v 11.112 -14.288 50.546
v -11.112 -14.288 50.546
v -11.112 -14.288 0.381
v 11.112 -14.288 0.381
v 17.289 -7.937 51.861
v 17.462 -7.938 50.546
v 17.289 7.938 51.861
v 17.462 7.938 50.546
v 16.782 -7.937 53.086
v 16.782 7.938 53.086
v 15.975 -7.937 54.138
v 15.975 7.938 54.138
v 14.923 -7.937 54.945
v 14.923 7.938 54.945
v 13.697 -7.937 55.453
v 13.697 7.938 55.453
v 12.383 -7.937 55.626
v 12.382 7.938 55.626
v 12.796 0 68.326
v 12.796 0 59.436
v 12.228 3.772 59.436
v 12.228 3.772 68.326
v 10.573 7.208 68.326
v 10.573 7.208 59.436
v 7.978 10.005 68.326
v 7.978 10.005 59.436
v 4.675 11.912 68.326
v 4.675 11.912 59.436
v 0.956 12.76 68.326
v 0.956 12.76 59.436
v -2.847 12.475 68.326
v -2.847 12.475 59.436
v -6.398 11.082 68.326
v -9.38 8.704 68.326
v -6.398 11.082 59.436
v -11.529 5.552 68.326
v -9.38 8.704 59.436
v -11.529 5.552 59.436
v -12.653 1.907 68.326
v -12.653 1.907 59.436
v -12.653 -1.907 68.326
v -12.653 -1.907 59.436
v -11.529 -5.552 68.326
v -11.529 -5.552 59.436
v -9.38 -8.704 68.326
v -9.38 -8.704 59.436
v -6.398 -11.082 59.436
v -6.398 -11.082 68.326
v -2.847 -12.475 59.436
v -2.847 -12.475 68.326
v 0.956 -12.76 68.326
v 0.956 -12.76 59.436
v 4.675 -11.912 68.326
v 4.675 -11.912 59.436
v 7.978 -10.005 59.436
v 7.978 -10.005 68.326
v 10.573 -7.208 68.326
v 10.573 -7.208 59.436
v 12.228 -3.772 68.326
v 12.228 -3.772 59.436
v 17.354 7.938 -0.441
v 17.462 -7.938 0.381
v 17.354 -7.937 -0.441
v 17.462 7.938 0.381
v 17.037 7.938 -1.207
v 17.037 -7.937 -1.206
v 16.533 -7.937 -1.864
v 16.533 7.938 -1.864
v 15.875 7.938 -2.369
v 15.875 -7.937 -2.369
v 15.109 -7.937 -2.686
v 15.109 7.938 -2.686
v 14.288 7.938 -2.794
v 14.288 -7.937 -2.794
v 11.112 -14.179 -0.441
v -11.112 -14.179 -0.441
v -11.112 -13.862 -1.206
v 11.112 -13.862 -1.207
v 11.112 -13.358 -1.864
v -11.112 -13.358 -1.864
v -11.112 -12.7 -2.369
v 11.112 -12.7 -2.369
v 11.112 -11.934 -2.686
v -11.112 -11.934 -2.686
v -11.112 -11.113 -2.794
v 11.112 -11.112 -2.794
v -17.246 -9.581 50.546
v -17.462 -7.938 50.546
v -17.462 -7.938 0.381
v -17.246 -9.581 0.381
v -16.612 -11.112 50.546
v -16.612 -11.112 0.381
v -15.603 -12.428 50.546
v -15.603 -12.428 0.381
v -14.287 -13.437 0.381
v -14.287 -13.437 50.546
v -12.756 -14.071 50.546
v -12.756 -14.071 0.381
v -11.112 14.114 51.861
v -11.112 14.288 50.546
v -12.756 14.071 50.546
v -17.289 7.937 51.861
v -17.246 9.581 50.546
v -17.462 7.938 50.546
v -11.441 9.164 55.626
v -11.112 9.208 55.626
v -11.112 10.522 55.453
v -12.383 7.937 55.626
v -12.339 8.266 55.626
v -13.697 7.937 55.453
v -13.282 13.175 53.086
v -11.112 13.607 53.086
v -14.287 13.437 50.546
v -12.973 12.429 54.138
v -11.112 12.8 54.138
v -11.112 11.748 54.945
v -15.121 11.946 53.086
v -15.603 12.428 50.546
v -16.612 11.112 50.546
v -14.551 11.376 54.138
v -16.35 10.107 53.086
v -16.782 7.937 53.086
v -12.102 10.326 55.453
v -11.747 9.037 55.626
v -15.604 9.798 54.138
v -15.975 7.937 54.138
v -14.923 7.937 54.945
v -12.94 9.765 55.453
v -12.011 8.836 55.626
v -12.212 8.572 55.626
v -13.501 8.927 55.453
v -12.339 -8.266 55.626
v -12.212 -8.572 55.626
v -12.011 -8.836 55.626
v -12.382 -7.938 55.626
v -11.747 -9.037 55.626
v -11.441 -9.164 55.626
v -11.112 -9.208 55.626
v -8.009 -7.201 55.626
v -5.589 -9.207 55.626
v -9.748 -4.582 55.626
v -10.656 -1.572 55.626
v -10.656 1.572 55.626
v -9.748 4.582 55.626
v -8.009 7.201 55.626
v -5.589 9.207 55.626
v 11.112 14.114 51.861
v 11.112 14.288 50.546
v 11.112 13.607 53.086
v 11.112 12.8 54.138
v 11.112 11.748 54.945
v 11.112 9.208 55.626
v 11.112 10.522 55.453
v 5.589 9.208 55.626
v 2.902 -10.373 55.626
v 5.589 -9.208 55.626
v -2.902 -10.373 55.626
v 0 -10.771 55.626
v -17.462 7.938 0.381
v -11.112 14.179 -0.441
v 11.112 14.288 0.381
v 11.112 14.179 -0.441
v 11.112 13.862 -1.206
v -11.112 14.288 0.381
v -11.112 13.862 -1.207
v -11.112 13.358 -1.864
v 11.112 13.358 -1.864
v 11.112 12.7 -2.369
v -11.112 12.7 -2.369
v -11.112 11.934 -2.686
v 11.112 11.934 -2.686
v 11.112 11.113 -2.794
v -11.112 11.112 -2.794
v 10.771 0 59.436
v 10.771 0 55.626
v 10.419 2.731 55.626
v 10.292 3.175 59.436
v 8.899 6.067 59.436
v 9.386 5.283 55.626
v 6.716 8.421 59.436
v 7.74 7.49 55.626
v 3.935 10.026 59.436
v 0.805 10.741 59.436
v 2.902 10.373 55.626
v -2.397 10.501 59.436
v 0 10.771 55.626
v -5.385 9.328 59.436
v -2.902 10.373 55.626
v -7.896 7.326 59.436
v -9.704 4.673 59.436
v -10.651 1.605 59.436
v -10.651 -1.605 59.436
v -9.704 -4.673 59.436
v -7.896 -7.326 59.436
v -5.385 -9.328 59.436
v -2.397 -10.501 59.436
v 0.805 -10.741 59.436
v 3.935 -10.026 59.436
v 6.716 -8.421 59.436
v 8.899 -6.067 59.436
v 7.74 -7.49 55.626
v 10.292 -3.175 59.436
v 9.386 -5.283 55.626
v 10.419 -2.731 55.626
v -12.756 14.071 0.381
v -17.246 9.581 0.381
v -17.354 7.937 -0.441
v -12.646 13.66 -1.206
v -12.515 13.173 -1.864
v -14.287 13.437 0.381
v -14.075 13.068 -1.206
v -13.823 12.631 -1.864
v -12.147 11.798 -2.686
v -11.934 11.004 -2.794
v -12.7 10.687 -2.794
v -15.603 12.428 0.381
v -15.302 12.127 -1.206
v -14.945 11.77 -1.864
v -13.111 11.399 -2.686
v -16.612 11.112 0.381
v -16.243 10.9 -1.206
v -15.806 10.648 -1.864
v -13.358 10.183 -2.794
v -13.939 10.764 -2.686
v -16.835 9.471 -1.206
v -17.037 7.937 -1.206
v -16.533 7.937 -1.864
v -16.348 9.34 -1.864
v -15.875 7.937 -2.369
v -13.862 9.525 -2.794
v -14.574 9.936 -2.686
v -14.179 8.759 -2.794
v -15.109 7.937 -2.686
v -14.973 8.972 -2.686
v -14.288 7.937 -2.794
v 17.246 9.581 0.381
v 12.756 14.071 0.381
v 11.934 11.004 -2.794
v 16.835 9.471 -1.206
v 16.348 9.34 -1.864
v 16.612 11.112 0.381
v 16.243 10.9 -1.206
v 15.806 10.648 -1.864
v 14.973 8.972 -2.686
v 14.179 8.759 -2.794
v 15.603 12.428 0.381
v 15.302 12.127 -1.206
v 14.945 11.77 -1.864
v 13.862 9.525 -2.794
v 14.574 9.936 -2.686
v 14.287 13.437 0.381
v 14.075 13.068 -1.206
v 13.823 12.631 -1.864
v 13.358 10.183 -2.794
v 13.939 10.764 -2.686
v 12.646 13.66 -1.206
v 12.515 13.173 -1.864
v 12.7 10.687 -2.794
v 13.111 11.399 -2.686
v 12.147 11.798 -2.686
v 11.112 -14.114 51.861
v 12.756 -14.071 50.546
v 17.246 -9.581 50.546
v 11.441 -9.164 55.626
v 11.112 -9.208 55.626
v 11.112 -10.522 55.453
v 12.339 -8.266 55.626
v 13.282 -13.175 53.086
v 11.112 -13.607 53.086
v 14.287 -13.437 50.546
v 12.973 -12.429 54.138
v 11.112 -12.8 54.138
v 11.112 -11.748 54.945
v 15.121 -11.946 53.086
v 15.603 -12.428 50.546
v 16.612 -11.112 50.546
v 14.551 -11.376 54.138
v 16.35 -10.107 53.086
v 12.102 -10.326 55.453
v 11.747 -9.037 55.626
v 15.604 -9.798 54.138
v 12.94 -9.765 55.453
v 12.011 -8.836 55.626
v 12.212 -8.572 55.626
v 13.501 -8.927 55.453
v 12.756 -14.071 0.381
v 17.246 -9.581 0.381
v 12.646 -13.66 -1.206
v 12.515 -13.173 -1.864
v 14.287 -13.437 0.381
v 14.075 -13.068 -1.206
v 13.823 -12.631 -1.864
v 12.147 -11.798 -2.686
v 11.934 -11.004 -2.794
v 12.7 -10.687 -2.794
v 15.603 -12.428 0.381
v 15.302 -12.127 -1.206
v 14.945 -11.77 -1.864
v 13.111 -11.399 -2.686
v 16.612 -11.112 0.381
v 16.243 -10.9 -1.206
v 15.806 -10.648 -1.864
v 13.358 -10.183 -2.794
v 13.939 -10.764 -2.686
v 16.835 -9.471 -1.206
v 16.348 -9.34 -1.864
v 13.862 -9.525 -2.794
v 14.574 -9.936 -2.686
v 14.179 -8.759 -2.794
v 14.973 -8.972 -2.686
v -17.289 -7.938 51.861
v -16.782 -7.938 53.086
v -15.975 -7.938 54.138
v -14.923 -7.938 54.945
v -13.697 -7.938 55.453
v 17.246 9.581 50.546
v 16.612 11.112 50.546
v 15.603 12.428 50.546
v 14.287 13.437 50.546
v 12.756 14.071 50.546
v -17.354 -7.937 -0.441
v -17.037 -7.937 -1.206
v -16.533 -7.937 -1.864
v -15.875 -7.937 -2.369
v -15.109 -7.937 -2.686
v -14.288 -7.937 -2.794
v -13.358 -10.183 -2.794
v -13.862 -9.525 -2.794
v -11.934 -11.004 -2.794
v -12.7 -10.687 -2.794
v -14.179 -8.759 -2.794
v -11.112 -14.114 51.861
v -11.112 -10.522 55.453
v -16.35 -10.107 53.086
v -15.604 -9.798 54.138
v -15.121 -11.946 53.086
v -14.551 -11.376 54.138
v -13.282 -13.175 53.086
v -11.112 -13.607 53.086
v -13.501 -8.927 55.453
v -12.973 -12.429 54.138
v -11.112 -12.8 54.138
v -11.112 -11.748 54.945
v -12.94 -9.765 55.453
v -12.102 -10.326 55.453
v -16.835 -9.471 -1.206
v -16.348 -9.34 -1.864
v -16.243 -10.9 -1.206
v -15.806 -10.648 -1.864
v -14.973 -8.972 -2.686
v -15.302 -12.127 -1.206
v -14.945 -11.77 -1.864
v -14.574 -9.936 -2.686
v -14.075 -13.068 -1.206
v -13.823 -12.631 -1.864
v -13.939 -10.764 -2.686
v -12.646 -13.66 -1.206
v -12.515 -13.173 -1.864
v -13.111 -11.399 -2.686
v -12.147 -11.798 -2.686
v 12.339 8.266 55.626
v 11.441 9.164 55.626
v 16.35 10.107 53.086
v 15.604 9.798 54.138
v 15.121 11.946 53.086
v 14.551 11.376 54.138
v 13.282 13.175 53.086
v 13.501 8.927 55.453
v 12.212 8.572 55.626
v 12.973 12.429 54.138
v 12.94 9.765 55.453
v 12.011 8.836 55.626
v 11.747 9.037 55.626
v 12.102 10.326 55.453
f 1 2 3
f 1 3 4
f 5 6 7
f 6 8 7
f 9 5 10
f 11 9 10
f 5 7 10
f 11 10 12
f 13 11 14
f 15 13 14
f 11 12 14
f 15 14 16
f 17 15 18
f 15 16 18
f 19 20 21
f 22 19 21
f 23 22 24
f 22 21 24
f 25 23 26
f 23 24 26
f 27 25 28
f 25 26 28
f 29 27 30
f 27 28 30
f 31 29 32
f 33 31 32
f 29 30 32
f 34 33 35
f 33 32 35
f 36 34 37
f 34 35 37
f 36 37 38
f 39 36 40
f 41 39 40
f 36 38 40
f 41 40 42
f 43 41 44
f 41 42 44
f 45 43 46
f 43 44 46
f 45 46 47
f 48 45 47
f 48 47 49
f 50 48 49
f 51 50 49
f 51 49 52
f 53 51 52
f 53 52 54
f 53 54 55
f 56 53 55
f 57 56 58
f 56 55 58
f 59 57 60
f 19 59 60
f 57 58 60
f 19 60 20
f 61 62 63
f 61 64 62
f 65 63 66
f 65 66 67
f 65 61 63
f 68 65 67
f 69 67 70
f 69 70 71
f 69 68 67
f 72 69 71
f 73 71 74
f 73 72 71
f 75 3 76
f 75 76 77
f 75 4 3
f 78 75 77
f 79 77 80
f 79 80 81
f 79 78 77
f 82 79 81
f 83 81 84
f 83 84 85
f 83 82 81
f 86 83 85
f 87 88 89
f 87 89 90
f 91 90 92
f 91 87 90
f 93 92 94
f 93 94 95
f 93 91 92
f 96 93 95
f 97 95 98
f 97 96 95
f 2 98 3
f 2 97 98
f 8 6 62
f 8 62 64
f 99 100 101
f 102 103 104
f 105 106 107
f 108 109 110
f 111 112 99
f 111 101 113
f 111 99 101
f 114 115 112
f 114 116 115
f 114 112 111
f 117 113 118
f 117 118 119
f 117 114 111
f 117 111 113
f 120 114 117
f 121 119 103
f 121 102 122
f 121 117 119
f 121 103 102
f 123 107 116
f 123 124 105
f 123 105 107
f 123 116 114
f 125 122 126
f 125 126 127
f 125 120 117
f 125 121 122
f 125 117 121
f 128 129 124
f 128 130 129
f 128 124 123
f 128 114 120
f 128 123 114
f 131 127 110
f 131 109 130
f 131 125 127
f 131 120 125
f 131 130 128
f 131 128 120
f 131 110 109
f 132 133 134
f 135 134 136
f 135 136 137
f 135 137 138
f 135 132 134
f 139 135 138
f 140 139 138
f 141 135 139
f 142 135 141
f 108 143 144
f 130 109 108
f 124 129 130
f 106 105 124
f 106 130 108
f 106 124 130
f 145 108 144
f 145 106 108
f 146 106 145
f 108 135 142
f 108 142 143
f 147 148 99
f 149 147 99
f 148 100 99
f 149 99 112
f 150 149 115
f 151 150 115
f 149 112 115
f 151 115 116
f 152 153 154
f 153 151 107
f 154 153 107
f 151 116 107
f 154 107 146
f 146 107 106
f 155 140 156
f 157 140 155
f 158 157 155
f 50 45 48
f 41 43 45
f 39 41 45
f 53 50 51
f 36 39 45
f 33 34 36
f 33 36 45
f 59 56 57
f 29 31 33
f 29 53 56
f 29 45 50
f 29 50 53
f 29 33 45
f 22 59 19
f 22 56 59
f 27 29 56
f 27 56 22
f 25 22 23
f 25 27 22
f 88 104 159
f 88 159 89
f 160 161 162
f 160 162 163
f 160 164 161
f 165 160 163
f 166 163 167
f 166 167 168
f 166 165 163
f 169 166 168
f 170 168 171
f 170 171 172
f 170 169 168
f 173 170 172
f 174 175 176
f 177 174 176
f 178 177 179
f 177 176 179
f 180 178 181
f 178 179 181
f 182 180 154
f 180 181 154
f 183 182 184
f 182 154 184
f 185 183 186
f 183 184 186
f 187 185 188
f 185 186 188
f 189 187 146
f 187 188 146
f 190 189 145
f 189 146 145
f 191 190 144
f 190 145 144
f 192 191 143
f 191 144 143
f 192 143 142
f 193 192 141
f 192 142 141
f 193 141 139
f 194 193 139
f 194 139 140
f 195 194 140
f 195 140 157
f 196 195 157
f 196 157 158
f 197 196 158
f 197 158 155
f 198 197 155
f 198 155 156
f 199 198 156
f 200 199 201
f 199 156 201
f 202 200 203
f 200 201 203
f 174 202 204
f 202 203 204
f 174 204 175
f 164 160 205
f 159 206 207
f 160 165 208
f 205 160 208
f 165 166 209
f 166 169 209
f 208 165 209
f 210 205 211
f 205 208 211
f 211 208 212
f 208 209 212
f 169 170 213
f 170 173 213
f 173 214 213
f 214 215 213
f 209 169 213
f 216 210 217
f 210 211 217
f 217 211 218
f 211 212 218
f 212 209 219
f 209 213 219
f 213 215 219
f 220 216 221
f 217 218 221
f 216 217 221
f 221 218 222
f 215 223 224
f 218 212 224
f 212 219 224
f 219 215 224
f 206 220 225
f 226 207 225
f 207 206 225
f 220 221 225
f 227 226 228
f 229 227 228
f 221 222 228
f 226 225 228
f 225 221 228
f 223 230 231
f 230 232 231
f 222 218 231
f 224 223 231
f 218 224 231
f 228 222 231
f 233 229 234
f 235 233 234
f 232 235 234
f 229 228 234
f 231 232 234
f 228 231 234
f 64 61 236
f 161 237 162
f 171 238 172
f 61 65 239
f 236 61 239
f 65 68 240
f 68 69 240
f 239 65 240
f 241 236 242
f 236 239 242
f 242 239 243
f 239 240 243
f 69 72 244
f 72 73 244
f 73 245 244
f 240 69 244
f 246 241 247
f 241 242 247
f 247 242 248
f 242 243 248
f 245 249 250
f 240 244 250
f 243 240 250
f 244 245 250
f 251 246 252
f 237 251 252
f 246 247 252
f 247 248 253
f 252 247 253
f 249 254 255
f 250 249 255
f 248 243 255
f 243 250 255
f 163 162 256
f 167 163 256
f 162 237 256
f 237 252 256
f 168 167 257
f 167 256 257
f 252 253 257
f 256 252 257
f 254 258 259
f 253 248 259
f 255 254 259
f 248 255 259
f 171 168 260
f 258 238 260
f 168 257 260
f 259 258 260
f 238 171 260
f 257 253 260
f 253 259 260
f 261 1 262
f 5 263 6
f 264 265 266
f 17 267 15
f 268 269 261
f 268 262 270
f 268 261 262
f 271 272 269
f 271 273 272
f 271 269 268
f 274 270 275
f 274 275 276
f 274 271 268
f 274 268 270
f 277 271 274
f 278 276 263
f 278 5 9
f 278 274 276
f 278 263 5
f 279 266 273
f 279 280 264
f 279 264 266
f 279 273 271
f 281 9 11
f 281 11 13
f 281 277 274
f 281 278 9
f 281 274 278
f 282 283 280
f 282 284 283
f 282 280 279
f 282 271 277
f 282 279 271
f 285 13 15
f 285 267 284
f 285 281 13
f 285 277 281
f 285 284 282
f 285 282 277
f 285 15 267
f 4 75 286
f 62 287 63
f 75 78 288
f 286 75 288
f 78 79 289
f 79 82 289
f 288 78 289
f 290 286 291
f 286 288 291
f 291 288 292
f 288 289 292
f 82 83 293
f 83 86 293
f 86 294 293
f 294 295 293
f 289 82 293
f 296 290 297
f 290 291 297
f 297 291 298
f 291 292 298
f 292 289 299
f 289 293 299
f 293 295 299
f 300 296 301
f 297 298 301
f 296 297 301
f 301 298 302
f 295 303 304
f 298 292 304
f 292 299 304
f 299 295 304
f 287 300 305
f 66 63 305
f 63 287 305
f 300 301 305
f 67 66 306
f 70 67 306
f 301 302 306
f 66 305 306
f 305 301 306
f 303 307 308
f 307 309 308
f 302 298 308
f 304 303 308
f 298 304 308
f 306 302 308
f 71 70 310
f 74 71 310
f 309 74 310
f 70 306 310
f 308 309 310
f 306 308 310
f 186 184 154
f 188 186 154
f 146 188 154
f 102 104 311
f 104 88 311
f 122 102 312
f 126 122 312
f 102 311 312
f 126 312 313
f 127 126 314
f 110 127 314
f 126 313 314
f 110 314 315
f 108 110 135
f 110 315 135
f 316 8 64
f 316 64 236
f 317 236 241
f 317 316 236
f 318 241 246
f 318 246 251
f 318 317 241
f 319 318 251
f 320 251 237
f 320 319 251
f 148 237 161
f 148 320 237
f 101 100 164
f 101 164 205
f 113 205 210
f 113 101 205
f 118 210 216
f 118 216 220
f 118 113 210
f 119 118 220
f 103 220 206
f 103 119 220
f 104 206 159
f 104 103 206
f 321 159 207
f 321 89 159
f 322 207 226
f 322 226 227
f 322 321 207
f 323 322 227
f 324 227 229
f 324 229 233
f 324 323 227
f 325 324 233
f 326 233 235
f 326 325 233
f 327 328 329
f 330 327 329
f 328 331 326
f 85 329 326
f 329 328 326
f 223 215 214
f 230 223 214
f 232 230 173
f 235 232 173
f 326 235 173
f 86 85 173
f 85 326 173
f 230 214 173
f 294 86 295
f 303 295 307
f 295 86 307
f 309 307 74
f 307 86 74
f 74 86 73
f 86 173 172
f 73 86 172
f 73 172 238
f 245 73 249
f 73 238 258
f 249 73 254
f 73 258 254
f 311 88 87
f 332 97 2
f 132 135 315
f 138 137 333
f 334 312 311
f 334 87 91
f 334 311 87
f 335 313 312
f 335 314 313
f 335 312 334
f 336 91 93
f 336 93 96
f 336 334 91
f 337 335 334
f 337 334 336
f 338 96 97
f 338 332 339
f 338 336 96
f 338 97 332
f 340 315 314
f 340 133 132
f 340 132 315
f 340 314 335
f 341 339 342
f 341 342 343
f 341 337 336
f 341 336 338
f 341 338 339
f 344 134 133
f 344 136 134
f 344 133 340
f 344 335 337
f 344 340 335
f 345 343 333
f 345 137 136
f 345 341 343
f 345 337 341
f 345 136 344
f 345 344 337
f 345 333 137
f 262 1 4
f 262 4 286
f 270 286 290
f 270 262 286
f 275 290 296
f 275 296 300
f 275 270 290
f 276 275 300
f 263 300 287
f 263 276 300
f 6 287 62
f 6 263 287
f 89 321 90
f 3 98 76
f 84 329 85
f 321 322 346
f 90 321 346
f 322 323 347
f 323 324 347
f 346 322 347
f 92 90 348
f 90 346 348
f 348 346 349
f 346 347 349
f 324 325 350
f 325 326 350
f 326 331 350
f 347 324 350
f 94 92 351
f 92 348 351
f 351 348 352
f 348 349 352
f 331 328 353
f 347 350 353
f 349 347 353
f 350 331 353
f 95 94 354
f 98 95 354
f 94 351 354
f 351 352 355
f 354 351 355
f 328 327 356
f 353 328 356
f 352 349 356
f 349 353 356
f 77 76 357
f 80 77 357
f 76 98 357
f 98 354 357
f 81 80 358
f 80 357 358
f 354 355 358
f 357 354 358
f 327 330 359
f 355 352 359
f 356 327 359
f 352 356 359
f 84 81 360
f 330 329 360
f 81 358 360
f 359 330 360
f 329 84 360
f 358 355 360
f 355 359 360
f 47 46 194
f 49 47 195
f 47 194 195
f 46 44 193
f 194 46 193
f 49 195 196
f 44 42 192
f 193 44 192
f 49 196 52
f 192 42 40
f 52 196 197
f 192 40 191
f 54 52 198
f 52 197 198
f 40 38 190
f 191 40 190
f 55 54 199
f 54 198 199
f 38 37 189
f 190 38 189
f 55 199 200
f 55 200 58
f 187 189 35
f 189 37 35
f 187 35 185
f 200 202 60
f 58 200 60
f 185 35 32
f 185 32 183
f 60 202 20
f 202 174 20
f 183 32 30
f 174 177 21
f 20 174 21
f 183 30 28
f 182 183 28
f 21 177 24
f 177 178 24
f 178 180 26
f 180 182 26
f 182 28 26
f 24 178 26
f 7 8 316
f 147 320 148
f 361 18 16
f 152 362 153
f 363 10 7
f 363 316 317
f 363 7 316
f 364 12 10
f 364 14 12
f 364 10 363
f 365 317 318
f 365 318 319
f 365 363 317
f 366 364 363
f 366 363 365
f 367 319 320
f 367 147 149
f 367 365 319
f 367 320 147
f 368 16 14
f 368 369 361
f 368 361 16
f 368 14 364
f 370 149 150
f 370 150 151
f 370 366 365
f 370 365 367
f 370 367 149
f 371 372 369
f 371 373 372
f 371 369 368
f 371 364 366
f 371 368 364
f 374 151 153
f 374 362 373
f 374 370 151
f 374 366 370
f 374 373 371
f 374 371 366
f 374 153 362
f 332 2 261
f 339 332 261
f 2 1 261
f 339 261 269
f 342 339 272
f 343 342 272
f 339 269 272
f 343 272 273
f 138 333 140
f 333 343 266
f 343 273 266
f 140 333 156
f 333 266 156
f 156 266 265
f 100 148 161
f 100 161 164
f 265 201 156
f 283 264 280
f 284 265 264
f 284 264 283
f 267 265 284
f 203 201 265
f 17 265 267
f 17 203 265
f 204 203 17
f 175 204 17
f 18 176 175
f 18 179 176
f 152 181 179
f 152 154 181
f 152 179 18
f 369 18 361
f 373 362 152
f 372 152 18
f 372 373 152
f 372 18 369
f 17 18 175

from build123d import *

# Parameters (mm, degrees)
F1_DEPTH = 55.626
F2_R     = 5.08
F3_DEPTH = 2.794
F4_R     = 3.175
F5_R     = 10.770919
F6_DEPTH = 3.81
F7_R     = 12.796254
F8_DEPTH = 8.89


with BuildPart() as f1:
    # F0 (on Top) → F1 (new body)
    with BuildSketch(Plane.XY):
        with BuildLine():
            ThreePointArc((-17.4625, -7.9375), (-15.602628, -12.427628), (-11.1125, -14.2875))
            Line((-11.1125, -14.2875), (11.1125, -14.2875))
            ThreePointArc((11.1125, -14.2875), (15.602628, -12.427628), (17.4625, -7.9375))
            Line((17.4625, -7.9375), (17.4625, 7.9375))
            ThreePointArc((17.4625, 7.9375), (15.602628, 12.427628), (11.1125, 14.2875))
            Line((11.1125, 14.2875), (-11.1125, 14.2875))
            ThreePointArc((-11.1125, 14.2875), (-15.602628, 12.427628), (-17.4625, 7.9375))
            Line((-17.4625, 7.9375), (-17.4625, -7.9375))
        make_face()
    extrude(amount=F1_DEPTH)

    # F2
    f2_edges = [f1.edges().sort_by_distance(p)[0] for p in [
        (15.602628, -12.427628, 55.626),
    ]]
    fillet(f2_edges, radius=F2_R)

    # F0 (on Top) → F3 (join)
    with BuildSketch(Plane.XY):
        with BuildLine():
            ThreePointArc((-17.4625, -7.9375), (-15.602628, -12.427628), (-11.1125, -14.2875))
            Line((-11.1125, -14.2875), (11.1125, -14.2875))
            ThreePointArc((11.1125, -14.2875), (15.602628, -12.427628), (17.4625, -7.9375))
            Line((17.4625, -7.9375), (17.4625, 7.9375))
            ThreePointArc((17.4625, 7.9375), (15.602628, 12.427628), (11.1125, 14.2875))
            Line((11.1125, 14.2875), (-11.1125, 14.2875))
            ThreePointArc((-11.1125, 14.2875), (-15.602628, 12.427628), (-17.4625, 7.9375))
            Line((-17.4625, 7.9375), (-17.4625, -7.9375))
        make_face()
    extrude(amount=-F3_DEPTH)

    # F4
    f4_edges = [f1.edges().sort_by_distance(p)[0] for p in [
        (-15.602628, -12.427628, -2.794),
    ]]
    fillet(f4_edges, radius=F4_R)

    # F5 (on face) → F6 (join)
    with BuildSketch(Plane.XY.offset(55.626)):
        Circle(F5_R)
    extrude(amount=F6_DEPTH)

    # F7 (on face) → F8 (join)
    with BuildSketch(Plane.XY.offset(59.436)):
        Circle(F7_R)
    extrude(amount=F8_DEPTH)


solid = f1.part
